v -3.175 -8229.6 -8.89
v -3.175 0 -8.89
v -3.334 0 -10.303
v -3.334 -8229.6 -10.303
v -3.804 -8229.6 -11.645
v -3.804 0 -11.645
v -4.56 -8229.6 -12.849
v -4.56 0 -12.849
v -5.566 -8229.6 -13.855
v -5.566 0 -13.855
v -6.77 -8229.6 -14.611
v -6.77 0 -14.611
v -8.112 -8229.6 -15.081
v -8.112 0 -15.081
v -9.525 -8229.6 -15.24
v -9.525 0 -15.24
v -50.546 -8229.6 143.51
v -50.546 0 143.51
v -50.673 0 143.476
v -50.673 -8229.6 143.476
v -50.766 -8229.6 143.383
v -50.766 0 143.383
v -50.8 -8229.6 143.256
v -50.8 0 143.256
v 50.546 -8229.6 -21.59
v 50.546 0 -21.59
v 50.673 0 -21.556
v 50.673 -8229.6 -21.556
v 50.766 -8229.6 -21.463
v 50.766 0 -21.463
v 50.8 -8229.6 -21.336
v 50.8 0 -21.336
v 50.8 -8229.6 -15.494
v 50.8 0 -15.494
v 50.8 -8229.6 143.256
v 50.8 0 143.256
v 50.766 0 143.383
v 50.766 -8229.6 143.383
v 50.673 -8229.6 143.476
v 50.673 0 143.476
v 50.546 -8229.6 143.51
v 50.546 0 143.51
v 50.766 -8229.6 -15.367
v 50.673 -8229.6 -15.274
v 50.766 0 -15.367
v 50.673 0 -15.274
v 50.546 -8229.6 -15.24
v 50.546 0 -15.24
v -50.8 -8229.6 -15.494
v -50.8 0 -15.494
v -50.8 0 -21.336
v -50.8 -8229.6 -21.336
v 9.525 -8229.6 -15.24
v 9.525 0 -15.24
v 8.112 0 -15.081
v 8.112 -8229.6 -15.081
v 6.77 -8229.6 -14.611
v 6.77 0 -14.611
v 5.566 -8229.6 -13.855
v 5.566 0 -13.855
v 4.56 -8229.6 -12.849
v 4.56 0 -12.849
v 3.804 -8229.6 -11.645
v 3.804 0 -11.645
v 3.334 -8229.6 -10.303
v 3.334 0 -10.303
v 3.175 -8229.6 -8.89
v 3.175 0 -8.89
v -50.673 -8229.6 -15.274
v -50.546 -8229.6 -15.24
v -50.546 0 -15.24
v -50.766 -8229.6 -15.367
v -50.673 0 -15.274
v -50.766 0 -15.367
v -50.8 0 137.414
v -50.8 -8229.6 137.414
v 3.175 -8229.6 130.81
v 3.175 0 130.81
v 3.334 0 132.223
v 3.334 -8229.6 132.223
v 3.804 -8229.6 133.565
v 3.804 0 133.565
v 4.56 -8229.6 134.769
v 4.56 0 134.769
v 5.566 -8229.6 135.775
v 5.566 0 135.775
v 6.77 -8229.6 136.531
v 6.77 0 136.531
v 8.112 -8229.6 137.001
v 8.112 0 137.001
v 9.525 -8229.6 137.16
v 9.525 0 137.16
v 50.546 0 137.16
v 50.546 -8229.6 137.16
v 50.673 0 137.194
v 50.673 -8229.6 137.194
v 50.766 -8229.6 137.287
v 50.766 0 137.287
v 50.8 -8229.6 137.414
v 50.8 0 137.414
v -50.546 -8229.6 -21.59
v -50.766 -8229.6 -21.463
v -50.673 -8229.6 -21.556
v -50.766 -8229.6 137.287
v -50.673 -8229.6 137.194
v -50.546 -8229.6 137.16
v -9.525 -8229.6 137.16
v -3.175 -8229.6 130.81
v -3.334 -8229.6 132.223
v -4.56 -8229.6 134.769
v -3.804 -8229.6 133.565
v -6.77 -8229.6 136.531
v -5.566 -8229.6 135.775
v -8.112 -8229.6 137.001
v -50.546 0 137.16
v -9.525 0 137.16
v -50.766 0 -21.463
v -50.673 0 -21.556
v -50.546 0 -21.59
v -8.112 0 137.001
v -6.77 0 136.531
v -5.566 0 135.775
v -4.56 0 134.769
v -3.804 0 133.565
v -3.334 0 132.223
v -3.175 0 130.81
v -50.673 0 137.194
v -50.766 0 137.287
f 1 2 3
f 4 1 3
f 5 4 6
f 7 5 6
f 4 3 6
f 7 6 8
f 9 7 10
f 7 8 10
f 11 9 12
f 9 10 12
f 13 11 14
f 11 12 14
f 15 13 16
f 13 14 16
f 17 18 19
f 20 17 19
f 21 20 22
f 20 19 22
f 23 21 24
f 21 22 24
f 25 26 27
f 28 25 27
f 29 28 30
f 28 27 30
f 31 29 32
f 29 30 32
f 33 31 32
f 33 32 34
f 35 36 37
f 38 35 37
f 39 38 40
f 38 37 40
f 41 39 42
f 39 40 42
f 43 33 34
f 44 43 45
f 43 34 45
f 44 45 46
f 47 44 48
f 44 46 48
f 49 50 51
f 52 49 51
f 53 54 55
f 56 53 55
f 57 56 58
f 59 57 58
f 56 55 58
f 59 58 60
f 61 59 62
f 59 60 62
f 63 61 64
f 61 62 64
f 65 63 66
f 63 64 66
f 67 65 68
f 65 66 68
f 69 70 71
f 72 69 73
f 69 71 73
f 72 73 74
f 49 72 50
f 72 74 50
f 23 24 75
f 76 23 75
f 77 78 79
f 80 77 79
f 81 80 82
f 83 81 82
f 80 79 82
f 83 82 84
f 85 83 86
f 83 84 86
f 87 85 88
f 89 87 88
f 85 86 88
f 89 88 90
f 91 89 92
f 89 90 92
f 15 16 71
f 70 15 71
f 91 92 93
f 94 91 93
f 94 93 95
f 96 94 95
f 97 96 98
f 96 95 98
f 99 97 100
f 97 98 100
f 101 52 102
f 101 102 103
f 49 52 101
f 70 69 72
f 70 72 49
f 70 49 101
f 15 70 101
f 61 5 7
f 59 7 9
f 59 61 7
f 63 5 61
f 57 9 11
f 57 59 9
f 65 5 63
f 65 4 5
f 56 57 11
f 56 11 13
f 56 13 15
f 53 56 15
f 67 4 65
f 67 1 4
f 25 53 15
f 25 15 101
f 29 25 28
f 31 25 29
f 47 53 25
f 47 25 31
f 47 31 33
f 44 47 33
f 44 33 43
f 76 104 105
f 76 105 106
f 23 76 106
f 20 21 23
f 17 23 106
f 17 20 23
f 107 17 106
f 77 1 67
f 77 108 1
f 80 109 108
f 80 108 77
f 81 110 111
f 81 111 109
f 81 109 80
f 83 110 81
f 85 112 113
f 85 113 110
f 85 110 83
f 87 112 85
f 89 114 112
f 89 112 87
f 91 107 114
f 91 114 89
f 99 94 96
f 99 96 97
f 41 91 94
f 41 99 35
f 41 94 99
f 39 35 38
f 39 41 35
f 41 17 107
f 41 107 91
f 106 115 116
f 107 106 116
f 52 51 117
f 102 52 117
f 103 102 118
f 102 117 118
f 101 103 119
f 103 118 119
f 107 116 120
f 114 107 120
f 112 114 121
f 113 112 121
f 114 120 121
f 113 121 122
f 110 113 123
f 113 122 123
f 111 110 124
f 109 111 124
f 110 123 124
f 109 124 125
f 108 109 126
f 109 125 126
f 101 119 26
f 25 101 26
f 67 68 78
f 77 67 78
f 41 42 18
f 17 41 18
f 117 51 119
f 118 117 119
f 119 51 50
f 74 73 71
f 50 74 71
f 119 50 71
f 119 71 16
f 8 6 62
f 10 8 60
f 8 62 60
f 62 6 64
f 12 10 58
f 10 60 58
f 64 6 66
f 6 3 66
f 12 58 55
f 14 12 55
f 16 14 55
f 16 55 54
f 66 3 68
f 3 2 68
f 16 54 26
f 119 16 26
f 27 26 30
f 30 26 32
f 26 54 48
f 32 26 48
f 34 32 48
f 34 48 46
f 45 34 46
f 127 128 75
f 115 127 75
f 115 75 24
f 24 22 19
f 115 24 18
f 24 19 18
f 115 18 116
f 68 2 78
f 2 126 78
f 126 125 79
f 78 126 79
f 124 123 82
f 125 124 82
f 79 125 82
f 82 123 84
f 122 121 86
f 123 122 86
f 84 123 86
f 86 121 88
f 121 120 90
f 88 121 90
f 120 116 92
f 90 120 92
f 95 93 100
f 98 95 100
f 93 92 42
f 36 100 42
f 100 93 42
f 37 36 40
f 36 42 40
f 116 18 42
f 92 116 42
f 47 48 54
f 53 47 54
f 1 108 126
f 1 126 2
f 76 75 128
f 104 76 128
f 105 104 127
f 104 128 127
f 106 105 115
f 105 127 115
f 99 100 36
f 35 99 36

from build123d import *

# Parameters (mm, degrees)
F1_DEPTH = 8229.6


with BuildPart() as f1:
    # F0 (on Front) → F1 (new body)
    with BuildSketch(Plane.XZ):
        with BuildLine():
            ThreePointArc((-50.8, 137.414), (-50.725605, 137.234395), (-50.546, 137.16))
            Line((-50.546, 137.16), (-9.525, 137.16))
            ThreePointArc((-9.525, 137.16), (-5.034872, 135.300128), (-3.175, 130.81))
            Line((-3.175, 130.81), (-3.175, -8.89))
            ThreePointArc((-3.175, -8.89), (-5.034872, -13.380128), (-9.525, -15.24))
            Line((-9.525, -15.24), (-50.546, -15.24))
            ThreePointArc((-50.546, -15.24), (-50.725605, -15.314395), (-50.8, -15.494))
            Line((-50.8, -15.494), (-50.8, -21.336))
            ThreePointArc((-50.8, -21.336), (-50.725605, -21.515605), (-50.546, -21.59))
            Line((-50.546, -21.59), (50.546, -21.59))
            ThreePointArc((50.546, -21.59), (50.725605, -21.515605), (50.8, -21.336))
            Line((50.8, -21.336), (50.8, -15.494))
            ThreePointArc((50.8, -15.494), (50.725605, -15.314395), (50.546, -15.24))
            Line((50.546, -15.24), (9.525, -15.24))
            ThreePointArc((9.525, -15.24), (5.034872, -13.380128), (3.175, -8.89))
            Line((3.175, -8.89), (3.175, 130.81))
            ThreePointArc((3.175, 130.81), (5.034872, 135.300128), (9.525, 137.16))
            Line((9.525, 137.16), (50.546, 137.16))
            ThreePointArc((50.546, 137.16), (50.725605, 137.234395), (50.8, 137.414))
            Line((50.8, 137.414), (50.8, 143.256))
            ThreePointArc((50.8, 143.256), (50.725605, 143.435605), (50.546, 143.51))
            Line((50.546, 143.51), (-50.546, 143.51))
            ThreePointArc((-50.546, 143.51), (-50.725605, 143.435605), (-50.8, 143.256))
            Line((-50.8, 143.256), (-50.8, 137.414))
        make_face()
    extrude(amount=F1_DEPTH)


solid = f1.part
